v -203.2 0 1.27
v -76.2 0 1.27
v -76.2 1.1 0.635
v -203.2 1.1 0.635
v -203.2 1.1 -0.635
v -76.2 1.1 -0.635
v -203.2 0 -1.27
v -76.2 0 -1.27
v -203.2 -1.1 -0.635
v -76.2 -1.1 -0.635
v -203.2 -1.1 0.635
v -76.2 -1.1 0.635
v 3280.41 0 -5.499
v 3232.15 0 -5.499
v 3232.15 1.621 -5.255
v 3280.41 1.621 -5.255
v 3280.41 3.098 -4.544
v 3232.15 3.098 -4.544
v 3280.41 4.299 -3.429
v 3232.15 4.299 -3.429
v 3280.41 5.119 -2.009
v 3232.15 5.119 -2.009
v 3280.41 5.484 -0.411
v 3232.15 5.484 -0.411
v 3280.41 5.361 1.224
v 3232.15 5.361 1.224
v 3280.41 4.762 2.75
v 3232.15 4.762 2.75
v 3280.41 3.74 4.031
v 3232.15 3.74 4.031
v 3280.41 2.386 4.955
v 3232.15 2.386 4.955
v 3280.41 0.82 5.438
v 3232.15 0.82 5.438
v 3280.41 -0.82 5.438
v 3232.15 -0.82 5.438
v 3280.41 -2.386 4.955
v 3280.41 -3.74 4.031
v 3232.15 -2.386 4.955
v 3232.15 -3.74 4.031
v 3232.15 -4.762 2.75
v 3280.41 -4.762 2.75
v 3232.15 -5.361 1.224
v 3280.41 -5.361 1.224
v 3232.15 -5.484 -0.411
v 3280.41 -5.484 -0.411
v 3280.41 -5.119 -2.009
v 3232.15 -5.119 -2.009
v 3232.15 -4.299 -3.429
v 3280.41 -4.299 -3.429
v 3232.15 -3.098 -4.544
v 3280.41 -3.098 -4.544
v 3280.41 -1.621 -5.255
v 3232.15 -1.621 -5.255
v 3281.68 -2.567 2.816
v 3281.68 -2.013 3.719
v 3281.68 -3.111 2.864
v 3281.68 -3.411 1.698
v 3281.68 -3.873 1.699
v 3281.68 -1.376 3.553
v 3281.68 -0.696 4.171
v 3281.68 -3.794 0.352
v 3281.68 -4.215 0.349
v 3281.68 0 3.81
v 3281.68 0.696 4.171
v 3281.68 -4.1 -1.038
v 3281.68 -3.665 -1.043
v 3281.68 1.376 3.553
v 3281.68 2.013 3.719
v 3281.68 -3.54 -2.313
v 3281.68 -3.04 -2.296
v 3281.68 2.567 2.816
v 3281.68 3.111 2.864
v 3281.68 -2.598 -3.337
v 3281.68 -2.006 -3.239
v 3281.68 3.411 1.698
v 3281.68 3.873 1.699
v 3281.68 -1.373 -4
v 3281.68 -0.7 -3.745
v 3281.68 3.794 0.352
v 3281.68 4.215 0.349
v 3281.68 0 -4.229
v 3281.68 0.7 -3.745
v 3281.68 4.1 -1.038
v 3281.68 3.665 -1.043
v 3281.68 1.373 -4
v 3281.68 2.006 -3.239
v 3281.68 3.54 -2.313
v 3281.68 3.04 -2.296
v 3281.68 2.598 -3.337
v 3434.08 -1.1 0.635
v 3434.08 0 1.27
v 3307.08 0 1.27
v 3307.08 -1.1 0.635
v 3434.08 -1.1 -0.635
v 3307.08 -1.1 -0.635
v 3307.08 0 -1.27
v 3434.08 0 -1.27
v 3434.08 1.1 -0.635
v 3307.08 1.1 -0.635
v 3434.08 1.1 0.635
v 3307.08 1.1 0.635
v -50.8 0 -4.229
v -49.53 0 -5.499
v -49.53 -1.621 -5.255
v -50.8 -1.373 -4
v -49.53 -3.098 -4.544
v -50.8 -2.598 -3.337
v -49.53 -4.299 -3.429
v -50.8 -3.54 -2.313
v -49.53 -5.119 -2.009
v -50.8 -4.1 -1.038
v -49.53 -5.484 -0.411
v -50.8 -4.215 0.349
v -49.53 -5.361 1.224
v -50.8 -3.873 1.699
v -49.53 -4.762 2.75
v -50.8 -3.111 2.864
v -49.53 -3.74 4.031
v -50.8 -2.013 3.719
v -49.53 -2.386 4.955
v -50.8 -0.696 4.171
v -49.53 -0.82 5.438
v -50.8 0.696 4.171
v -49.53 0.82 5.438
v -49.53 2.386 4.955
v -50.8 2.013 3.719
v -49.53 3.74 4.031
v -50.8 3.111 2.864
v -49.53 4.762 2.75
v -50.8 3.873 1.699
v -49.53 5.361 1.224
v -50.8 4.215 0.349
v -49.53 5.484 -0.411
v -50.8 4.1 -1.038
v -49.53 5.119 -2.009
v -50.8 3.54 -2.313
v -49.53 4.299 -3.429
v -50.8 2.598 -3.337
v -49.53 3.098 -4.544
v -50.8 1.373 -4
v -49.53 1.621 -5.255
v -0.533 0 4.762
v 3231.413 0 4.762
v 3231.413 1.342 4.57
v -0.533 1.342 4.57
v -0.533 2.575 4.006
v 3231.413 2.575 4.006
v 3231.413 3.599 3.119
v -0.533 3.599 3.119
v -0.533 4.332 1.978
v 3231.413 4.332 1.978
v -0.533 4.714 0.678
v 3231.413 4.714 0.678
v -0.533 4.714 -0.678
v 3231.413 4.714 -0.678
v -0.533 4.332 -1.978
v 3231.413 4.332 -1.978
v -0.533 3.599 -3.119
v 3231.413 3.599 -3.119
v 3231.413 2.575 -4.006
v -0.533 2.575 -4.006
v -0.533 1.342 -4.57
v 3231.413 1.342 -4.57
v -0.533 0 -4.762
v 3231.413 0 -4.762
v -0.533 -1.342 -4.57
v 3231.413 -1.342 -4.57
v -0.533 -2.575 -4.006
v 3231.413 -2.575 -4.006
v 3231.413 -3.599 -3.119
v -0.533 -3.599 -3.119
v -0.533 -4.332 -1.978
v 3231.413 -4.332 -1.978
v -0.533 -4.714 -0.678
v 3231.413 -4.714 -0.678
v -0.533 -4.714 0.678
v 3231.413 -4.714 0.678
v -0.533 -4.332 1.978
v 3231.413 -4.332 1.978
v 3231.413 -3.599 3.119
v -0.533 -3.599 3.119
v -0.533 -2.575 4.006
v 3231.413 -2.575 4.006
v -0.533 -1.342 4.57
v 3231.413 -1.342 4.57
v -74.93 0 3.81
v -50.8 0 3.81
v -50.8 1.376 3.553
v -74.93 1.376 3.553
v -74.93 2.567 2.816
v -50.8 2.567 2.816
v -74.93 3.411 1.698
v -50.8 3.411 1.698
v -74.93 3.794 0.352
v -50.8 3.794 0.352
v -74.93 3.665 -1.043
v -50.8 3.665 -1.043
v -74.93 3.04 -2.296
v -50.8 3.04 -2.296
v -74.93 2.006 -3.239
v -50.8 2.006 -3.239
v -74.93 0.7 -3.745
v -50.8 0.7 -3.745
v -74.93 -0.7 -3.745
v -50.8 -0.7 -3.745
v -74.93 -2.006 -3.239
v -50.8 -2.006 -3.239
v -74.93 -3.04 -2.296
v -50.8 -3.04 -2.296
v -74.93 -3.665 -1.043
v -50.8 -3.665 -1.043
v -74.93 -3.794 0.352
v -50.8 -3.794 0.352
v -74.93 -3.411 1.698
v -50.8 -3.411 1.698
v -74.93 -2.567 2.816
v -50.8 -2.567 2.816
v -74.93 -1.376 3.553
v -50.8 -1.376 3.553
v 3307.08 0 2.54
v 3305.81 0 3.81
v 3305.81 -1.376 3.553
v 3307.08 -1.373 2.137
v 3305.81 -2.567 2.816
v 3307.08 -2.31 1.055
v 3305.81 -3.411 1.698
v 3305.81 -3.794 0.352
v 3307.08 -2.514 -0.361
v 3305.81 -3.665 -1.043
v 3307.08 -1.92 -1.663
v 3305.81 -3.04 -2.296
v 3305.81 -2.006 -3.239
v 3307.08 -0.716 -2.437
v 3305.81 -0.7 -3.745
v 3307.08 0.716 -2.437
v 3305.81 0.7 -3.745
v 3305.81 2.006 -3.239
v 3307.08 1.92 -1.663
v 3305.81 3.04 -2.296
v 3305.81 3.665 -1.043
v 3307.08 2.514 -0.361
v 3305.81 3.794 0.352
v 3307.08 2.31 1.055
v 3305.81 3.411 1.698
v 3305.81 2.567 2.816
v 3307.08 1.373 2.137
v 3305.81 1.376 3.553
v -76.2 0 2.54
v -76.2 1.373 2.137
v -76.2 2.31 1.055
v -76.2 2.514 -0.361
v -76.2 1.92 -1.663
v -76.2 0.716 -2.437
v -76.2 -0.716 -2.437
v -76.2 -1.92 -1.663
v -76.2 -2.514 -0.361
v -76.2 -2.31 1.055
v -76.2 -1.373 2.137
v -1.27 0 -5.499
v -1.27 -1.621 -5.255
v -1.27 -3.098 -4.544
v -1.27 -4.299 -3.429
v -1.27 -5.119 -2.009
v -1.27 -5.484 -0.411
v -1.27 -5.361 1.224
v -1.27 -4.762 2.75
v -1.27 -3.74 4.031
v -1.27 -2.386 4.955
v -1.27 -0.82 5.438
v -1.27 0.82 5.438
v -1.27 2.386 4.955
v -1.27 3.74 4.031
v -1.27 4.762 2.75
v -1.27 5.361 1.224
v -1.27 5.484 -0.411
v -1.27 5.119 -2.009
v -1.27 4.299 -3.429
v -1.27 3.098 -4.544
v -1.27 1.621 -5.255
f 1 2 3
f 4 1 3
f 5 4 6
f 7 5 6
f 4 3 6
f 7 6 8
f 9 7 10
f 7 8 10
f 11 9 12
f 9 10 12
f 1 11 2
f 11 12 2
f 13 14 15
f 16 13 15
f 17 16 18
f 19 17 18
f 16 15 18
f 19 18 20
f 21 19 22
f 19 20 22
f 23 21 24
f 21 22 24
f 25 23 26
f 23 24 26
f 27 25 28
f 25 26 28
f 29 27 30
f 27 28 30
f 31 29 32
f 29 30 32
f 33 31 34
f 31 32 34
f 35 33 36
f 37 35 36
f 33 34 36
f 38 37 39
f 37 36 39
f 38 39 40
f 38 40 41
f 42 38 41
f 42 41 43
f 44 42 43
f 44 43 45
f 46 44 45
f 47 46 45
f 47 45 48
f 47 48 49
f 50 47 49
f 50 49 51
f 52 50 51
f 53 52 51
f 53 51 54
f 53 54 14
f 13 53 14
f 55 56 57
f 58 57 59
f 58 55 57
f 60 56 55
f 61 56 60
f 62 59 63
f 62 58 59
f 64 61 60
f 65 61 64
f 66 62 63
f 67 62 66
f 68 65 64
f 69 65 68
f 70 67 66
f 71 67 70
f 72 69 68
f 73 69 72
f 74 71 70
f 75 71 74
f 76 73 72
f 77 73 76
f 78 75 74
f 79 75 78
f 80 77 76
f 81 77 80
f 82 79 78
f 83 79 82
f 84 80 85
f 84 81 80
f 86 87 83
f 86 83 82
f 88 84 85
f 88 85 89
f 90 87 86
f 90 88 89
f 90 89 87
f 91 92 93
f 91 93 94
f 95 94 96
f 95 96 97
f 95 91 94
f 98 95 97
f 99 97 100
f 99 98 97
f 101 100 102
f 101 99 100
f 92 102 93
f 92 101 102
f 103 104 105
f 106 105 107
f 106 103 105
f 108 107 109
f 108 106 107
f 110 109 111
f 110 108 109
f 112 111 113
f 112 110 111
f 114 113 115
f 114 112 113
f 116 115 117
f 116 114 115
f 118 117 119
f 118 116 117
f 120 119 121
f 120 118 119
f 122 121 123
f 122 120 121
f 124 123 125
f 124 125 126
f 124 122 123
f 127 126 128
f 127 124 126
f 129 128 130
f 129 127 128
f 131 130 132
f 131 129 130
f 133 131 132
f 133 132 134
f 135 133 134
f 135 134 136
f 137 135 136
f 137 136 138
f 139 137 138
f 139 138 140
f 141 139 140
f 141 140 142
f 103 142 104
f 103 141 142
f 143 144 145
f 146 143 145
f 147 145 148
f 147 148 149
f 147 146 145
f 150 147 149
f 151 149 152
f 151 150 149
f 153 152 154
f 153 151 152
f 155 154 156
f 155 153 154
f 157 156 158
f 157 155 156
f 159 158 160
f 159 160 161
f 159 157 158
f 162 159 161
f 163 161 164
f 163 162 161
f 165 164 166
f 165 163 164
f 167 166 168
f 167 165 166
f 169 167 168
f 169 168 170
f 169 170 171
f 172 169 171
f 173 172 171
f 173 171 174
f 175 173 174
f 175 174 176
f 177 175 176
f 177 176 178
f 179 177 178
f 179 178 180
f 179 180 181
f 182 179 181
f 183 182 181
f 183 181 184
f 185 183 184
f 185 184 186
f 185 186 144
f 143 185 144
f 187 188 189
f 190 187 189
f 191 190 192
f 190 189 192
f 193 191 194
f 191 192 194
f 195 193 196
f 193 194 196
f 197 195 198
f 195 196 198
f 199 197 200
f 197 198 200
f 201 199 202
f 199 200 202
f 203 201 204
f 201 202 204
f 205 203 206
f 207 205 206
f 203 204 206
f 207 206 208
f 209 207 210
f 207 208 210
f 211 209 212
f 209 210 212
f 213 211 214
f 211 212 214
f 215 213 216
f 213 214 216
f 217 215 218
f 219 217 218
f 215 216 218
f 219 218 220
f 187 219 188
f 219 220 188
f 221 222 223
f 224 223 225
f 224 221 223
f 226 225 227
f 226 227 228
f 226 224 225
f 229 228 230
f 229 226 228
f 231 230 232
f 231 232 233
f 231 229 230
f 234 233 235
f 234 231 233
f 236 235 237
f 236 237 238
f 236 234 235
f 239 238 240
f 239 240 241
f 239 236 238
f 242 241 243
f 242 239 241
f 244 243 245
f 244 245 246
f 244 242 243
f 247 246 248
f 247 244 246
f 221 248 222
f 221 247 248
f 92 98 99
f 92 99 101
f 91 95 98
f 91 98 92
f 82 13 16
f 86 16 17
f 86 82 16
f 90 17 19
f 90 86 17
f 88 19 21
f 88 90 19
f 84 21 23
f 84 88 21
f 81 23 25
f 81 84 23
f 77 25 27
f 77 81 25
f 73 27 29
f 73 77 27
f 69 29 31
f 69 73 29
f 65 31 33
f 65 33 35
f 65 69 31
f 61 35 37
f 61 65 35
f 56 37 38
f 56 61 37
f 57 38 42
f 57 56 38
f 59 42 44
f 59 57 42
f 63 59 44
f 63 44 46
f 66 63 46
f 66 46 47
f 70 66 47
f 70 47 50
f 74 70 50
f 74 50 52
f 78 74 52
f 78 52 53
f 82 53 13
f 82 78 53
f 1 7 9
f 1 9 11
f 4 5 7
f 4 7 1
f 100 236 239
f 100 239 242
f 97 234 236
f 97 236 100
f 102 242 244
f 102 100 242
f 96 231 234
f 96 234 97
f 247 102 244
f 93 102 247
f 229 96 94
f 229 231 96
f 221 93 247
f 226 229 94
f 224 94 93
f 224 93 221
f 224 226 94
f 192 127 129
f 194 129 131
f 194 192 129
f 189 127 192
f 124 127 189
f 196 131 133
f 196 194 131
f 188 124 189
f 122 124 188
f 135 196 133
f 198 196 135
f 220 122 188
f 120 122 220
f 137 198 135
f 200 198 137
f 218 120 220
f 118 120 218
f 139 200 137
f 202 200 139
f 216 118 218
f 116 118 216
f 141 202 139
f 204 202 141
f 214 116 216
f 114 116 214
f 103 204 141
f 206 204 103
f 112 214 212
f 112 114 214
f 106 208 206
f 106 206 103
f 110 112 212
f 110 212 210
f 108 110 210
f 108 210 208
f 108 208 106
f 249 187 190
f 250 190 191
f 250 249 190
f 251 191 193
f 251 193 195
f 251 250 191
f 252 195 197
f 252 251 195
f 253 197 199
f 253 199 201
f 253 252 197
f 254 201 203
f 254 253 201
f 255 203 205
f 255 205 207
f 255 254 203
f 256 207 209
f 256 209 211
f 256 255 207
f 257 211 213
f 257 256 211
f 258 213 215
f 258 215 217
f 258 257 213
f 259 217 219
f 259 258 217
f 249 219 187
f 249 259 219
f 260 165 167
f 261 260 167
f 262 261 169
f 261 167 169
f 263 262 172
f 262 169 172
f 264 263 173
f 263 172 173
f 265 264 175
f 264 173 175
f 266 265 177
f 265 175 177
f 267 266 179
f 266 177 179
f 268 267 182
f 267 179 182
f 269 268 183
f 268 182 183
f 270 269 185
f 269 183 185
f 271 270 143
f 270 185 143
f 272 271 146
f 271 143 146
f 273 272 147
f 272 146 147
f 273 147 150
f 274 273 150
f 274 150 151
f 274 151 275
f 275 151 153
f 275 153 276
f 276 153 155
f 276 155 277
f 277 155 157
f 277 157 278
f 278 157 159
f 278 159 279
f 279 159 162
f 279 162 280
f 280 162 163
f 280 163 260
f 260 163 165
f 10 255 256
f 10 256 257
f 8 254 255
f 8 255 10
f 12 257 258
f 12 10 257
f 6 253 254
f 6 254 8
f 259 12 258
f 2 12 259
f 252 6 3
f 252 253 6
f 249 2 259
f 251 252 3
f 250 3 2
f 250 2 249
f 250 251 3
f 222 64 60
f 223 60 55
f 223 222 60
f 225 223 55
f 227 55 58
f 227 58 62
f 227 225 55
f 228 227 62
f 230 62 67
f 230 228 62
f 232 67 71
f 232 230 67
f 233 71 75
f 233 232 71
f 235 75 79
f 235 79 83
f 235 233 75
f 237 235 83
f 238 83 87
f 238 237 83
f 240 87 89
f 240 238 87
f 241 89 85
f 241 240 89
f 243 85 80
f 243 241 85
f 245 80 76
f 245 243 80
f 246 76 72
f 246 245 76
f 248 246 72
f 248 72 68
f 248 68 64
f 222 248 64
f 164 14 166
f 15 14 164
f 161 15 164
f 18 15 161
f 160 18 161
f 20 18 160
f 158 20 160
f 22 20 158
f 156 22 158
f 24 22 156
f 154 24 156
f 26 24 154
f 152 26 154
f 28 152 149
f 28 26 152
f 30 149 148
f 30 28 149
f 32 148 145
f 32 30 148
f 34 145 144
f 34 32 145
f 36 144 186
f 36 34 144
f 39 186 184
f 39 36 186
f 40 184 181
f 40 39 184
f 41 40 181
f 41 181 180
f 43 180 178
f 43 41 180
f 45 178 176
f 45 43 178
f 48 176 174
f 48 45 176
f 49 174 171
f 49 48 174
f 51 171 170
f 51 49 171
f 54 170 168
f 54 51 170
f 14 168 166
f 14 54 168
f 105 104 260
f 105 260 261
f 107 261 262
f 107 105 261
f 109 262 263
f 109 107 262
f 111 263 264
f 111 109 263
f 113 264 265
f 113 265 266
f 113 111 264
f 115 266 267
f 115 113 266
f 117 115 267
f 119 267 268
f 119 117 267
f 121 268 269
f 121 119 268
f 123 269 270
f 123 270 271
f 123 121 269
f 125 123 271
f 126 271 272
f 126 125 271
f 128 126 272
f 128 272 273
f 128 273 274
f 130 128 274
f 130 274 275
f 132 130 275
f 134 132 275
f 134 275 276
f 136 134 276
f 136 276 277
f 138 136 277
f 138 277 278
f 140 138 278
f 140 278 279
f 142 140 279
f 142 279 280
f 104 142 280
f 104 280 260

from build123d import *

# Parameters (mm, degrees)
SKETCH3_R           = 4.7625
BOSS_EXTRUDE1_DEPTH = 3230.88
SKETCH4_R           = 5.4991
BOSS_EXTRUDE2_DEPTH = 50.8
BOSS_EXTRUDE3_START = 50.8
SKETCH5_R           = 5.4991
BOSS_EXTRUDE3_DEPTH = 50.8
SKETCH6_R           = 3.81
BOSS_EXTRUDE4_DEPTH = 25.4
BOSS_EXTRUDE5_START = 25.4
SKETCH7_R           = 3.81
BOSS_EXTRUDE5_DEPTH = 25.4
CHAMFER1_SIZE       = 1.27
SKETCH8_R           = 1.27
BOSS_EXTRUDE6_DEPTH = 127
BOSS_EXTRUDE7_START = 127
SKETCH9_R           = 1.27
BOSS_EXTRUDE7_DEPTH = 127


with BuildPart() as part:
    # Sketch3 → Boss-Extrude1 (new body)
    with BuildSketch(Plane(origin=(0, 0, 0), x_dir=(0, 0, -1), z_dir=(1, 0, 0))):
        with Locations(Location((0, 0, 0), (0, 0, 180))):
            Circle(SKETCH3_R)
    extrude(amount=BOSS_EXTRUDE1_DEPTH)

    # Sketch4 → Boss-Extrude2 (add)
    with BuildSketch(Plane(origin=(3230.88, 0, 0), x_dir=(0, 0, -1), z_dir=(1, 0, 0))):
        Circle(SKETCH4_R)
    extrude(amount=BOSS_EXTRUDE2_DEPTH)

    # Sketch5 → Boss-Extrude3 (add)
    with BuildSketch(Plane.ZY.offset(BOSS_EXTRUDE3_START)):
        with Locations(Location((0, 0, 0), (0, 0, 180))):
            Circle(SKETCH5_R)
    extrude(amount=-BOSS_EXTRUDE3_DEPTH)

    # Sketch6 → Boss-Extrude4 (add)
    with BuildSketch(Plane.ZY.offset(50.8)):
        Circle(SKETCH6_R)
    extrude(amount=BOSS_EXTRUDE4_DEPTH)

    # Sketch7 → Boss-Extrude5 (add)
    with BuildSketch(Plane(origin=(3281.68, 0, 0), x_dir=(0, 0, -1), z_dir=(1, 0, 0)).offset(BOSS_EXTRUDE5_START)):
        with Locations(Location((0, 0, 0), (0, 0, 180))):
            Circle(SKETCH7_R)
    extrude(amount=-BOSS_EXTRUDE5_DEPTH)

    # Chamfer1
    # the kernel refuses this chamfer: 1.27 mm, written as the material it takes off along each edge
    with BuildSketch(Plane(origin=(-76.2, 0, 0), x_dir=(0, 0, 1), z_dir=(0, -1, 0))) as chamfer1_piece_1:
        Polygon((3.81, -CHAMFER1_SIZE), (3.81 - CHAMFER1_SIZE, 0), (3.81, 0), align=None)
    revolve(axis=Axis((-76.2, 0, 0), (-1, 0, 0)), mode=Mode.SUBTRACT)
    with BuildSketch(Plane(origin=(0, 0, 0), x_dir=(0, 0, -1), z_dir=(0, 1, 0))) as chamfer1_piece_2_section:
        Polygon((5.4991, CHAMFER1_SIZE), (5.4991 - CHAMFER1_SIZE, 0), (5.4991, 0), align=None)
    chamfer1_piece_2 = revolve(axis=Axis((0, 0, 0), (-1, 0, 0)), mode=Mode.PRIVATE)
    chamfer1_piece_2 = chamfer1_piece_2 - Plane(origin=(-0.899385483, 0, 0), x_dir=(0, 0, 1), z_dir=(-1, 0, 0)) * Cylinder(4.7625, 22, mode=Mode.PRIVATE)
    add(chamfer1_piece_2, mode=Mode.SUBTRACT)
    with BuildSketch(Plane(origin=(-50.8, 0, 0), x_dir=(0, 0, -1), z_dir=(0, 1, 0))) as chamfer1_piece_3:
        Polygon((5.4991, -CHAMFER1_SIZE), (5.4991 - CHAMFER1_SIZE, 0), (5.4991, 0), align=None)
    revolve(axis=Axis((-50.8, 0, 0), (-1, 0, 0)), mode=Mode.SUBTRACT)
    with BuildSketch(Plane(origin=(3307.08, 0, 0), x_dir=(0, 0, 1), z_dir=(0, 1, 0))) as chamfer1_piece_4:
        Polygon((3.81, -CHAMFER1_SIZE), (3.81 - CHAMFER1_SIZE, 0), (3.81, 0), align=None)
    revolve(axis=Axis((3307.08, 0, 0), (1, 0, 0)), mode=Mode.SUBTRACT)
    with BuildSketch(Plane(origin=(3281.68, 0, 0), x_dir=(0, 0, -1), z_dir=(0, -1, 0))) as chamfer1_piece_5:
        Polygon((5.4991, -CHAMFER1_SIZE), (5.4991 - CHAMFER1_SIZE, 0), (5.4991, 0), align=None)
    revolve(axis=Axis((3281.68, 0, 0), (1, 0, 0)), mode=Mode.SUBTRACT)
    with BuildSketch(Plane(origin=(3230.88, 0, 0), x_dir=(0, 0, -1), z_dir=(0, -1, 0))) as chamfer1_piece_6_section:
        Polygon((5.4991 - CHAMFER1_SIZE, 0), (5.4991, CHAMFER1_SIZE), (5.4991, 0), align=None)
    chamfer1_piece_6 = revolve(axis=Axis((3230.88, 0, 0), (1, 0, 0)), mode=Mode.PRIVATE)
    chamfer1_piece_6 = chamfer1_piece_6 - Plane(origin=(3231.779385483, 0, 0), x_dir=(0, 0, 1), z_dir=(-1, 0, 0)) * Cylinder(4.7625, 22, mode=Mode.PRIVATE)
    add(chamfer1_piece_6, mode=Mode.SUBTRACT)

    # Sketch8 → Boss-Extrude6 (add)
    with BuildSketch(Plane.ZY.offset(76.2)):
        Circle(SKETCH8_R)
    extrude(amount=BOSS_EXTRUDE6_DEPTH)

    # Sketch9 → Boss-Extrude7 (add)
    with BuildSketch(Plane(origin=(3307.08, 0, 0), x_dir=(0, 0, -1), z_dir=(1, 0, 0)).offset(BOSS_EXTRUDE7_START)):
        with Locations(Location((0, 0, 0), (0, 0, 180))):
            Circle(SKETCH9_R)
    extrude(amount=-BOSS_EXTRUDE7_DEPTH)


solid = part.part
